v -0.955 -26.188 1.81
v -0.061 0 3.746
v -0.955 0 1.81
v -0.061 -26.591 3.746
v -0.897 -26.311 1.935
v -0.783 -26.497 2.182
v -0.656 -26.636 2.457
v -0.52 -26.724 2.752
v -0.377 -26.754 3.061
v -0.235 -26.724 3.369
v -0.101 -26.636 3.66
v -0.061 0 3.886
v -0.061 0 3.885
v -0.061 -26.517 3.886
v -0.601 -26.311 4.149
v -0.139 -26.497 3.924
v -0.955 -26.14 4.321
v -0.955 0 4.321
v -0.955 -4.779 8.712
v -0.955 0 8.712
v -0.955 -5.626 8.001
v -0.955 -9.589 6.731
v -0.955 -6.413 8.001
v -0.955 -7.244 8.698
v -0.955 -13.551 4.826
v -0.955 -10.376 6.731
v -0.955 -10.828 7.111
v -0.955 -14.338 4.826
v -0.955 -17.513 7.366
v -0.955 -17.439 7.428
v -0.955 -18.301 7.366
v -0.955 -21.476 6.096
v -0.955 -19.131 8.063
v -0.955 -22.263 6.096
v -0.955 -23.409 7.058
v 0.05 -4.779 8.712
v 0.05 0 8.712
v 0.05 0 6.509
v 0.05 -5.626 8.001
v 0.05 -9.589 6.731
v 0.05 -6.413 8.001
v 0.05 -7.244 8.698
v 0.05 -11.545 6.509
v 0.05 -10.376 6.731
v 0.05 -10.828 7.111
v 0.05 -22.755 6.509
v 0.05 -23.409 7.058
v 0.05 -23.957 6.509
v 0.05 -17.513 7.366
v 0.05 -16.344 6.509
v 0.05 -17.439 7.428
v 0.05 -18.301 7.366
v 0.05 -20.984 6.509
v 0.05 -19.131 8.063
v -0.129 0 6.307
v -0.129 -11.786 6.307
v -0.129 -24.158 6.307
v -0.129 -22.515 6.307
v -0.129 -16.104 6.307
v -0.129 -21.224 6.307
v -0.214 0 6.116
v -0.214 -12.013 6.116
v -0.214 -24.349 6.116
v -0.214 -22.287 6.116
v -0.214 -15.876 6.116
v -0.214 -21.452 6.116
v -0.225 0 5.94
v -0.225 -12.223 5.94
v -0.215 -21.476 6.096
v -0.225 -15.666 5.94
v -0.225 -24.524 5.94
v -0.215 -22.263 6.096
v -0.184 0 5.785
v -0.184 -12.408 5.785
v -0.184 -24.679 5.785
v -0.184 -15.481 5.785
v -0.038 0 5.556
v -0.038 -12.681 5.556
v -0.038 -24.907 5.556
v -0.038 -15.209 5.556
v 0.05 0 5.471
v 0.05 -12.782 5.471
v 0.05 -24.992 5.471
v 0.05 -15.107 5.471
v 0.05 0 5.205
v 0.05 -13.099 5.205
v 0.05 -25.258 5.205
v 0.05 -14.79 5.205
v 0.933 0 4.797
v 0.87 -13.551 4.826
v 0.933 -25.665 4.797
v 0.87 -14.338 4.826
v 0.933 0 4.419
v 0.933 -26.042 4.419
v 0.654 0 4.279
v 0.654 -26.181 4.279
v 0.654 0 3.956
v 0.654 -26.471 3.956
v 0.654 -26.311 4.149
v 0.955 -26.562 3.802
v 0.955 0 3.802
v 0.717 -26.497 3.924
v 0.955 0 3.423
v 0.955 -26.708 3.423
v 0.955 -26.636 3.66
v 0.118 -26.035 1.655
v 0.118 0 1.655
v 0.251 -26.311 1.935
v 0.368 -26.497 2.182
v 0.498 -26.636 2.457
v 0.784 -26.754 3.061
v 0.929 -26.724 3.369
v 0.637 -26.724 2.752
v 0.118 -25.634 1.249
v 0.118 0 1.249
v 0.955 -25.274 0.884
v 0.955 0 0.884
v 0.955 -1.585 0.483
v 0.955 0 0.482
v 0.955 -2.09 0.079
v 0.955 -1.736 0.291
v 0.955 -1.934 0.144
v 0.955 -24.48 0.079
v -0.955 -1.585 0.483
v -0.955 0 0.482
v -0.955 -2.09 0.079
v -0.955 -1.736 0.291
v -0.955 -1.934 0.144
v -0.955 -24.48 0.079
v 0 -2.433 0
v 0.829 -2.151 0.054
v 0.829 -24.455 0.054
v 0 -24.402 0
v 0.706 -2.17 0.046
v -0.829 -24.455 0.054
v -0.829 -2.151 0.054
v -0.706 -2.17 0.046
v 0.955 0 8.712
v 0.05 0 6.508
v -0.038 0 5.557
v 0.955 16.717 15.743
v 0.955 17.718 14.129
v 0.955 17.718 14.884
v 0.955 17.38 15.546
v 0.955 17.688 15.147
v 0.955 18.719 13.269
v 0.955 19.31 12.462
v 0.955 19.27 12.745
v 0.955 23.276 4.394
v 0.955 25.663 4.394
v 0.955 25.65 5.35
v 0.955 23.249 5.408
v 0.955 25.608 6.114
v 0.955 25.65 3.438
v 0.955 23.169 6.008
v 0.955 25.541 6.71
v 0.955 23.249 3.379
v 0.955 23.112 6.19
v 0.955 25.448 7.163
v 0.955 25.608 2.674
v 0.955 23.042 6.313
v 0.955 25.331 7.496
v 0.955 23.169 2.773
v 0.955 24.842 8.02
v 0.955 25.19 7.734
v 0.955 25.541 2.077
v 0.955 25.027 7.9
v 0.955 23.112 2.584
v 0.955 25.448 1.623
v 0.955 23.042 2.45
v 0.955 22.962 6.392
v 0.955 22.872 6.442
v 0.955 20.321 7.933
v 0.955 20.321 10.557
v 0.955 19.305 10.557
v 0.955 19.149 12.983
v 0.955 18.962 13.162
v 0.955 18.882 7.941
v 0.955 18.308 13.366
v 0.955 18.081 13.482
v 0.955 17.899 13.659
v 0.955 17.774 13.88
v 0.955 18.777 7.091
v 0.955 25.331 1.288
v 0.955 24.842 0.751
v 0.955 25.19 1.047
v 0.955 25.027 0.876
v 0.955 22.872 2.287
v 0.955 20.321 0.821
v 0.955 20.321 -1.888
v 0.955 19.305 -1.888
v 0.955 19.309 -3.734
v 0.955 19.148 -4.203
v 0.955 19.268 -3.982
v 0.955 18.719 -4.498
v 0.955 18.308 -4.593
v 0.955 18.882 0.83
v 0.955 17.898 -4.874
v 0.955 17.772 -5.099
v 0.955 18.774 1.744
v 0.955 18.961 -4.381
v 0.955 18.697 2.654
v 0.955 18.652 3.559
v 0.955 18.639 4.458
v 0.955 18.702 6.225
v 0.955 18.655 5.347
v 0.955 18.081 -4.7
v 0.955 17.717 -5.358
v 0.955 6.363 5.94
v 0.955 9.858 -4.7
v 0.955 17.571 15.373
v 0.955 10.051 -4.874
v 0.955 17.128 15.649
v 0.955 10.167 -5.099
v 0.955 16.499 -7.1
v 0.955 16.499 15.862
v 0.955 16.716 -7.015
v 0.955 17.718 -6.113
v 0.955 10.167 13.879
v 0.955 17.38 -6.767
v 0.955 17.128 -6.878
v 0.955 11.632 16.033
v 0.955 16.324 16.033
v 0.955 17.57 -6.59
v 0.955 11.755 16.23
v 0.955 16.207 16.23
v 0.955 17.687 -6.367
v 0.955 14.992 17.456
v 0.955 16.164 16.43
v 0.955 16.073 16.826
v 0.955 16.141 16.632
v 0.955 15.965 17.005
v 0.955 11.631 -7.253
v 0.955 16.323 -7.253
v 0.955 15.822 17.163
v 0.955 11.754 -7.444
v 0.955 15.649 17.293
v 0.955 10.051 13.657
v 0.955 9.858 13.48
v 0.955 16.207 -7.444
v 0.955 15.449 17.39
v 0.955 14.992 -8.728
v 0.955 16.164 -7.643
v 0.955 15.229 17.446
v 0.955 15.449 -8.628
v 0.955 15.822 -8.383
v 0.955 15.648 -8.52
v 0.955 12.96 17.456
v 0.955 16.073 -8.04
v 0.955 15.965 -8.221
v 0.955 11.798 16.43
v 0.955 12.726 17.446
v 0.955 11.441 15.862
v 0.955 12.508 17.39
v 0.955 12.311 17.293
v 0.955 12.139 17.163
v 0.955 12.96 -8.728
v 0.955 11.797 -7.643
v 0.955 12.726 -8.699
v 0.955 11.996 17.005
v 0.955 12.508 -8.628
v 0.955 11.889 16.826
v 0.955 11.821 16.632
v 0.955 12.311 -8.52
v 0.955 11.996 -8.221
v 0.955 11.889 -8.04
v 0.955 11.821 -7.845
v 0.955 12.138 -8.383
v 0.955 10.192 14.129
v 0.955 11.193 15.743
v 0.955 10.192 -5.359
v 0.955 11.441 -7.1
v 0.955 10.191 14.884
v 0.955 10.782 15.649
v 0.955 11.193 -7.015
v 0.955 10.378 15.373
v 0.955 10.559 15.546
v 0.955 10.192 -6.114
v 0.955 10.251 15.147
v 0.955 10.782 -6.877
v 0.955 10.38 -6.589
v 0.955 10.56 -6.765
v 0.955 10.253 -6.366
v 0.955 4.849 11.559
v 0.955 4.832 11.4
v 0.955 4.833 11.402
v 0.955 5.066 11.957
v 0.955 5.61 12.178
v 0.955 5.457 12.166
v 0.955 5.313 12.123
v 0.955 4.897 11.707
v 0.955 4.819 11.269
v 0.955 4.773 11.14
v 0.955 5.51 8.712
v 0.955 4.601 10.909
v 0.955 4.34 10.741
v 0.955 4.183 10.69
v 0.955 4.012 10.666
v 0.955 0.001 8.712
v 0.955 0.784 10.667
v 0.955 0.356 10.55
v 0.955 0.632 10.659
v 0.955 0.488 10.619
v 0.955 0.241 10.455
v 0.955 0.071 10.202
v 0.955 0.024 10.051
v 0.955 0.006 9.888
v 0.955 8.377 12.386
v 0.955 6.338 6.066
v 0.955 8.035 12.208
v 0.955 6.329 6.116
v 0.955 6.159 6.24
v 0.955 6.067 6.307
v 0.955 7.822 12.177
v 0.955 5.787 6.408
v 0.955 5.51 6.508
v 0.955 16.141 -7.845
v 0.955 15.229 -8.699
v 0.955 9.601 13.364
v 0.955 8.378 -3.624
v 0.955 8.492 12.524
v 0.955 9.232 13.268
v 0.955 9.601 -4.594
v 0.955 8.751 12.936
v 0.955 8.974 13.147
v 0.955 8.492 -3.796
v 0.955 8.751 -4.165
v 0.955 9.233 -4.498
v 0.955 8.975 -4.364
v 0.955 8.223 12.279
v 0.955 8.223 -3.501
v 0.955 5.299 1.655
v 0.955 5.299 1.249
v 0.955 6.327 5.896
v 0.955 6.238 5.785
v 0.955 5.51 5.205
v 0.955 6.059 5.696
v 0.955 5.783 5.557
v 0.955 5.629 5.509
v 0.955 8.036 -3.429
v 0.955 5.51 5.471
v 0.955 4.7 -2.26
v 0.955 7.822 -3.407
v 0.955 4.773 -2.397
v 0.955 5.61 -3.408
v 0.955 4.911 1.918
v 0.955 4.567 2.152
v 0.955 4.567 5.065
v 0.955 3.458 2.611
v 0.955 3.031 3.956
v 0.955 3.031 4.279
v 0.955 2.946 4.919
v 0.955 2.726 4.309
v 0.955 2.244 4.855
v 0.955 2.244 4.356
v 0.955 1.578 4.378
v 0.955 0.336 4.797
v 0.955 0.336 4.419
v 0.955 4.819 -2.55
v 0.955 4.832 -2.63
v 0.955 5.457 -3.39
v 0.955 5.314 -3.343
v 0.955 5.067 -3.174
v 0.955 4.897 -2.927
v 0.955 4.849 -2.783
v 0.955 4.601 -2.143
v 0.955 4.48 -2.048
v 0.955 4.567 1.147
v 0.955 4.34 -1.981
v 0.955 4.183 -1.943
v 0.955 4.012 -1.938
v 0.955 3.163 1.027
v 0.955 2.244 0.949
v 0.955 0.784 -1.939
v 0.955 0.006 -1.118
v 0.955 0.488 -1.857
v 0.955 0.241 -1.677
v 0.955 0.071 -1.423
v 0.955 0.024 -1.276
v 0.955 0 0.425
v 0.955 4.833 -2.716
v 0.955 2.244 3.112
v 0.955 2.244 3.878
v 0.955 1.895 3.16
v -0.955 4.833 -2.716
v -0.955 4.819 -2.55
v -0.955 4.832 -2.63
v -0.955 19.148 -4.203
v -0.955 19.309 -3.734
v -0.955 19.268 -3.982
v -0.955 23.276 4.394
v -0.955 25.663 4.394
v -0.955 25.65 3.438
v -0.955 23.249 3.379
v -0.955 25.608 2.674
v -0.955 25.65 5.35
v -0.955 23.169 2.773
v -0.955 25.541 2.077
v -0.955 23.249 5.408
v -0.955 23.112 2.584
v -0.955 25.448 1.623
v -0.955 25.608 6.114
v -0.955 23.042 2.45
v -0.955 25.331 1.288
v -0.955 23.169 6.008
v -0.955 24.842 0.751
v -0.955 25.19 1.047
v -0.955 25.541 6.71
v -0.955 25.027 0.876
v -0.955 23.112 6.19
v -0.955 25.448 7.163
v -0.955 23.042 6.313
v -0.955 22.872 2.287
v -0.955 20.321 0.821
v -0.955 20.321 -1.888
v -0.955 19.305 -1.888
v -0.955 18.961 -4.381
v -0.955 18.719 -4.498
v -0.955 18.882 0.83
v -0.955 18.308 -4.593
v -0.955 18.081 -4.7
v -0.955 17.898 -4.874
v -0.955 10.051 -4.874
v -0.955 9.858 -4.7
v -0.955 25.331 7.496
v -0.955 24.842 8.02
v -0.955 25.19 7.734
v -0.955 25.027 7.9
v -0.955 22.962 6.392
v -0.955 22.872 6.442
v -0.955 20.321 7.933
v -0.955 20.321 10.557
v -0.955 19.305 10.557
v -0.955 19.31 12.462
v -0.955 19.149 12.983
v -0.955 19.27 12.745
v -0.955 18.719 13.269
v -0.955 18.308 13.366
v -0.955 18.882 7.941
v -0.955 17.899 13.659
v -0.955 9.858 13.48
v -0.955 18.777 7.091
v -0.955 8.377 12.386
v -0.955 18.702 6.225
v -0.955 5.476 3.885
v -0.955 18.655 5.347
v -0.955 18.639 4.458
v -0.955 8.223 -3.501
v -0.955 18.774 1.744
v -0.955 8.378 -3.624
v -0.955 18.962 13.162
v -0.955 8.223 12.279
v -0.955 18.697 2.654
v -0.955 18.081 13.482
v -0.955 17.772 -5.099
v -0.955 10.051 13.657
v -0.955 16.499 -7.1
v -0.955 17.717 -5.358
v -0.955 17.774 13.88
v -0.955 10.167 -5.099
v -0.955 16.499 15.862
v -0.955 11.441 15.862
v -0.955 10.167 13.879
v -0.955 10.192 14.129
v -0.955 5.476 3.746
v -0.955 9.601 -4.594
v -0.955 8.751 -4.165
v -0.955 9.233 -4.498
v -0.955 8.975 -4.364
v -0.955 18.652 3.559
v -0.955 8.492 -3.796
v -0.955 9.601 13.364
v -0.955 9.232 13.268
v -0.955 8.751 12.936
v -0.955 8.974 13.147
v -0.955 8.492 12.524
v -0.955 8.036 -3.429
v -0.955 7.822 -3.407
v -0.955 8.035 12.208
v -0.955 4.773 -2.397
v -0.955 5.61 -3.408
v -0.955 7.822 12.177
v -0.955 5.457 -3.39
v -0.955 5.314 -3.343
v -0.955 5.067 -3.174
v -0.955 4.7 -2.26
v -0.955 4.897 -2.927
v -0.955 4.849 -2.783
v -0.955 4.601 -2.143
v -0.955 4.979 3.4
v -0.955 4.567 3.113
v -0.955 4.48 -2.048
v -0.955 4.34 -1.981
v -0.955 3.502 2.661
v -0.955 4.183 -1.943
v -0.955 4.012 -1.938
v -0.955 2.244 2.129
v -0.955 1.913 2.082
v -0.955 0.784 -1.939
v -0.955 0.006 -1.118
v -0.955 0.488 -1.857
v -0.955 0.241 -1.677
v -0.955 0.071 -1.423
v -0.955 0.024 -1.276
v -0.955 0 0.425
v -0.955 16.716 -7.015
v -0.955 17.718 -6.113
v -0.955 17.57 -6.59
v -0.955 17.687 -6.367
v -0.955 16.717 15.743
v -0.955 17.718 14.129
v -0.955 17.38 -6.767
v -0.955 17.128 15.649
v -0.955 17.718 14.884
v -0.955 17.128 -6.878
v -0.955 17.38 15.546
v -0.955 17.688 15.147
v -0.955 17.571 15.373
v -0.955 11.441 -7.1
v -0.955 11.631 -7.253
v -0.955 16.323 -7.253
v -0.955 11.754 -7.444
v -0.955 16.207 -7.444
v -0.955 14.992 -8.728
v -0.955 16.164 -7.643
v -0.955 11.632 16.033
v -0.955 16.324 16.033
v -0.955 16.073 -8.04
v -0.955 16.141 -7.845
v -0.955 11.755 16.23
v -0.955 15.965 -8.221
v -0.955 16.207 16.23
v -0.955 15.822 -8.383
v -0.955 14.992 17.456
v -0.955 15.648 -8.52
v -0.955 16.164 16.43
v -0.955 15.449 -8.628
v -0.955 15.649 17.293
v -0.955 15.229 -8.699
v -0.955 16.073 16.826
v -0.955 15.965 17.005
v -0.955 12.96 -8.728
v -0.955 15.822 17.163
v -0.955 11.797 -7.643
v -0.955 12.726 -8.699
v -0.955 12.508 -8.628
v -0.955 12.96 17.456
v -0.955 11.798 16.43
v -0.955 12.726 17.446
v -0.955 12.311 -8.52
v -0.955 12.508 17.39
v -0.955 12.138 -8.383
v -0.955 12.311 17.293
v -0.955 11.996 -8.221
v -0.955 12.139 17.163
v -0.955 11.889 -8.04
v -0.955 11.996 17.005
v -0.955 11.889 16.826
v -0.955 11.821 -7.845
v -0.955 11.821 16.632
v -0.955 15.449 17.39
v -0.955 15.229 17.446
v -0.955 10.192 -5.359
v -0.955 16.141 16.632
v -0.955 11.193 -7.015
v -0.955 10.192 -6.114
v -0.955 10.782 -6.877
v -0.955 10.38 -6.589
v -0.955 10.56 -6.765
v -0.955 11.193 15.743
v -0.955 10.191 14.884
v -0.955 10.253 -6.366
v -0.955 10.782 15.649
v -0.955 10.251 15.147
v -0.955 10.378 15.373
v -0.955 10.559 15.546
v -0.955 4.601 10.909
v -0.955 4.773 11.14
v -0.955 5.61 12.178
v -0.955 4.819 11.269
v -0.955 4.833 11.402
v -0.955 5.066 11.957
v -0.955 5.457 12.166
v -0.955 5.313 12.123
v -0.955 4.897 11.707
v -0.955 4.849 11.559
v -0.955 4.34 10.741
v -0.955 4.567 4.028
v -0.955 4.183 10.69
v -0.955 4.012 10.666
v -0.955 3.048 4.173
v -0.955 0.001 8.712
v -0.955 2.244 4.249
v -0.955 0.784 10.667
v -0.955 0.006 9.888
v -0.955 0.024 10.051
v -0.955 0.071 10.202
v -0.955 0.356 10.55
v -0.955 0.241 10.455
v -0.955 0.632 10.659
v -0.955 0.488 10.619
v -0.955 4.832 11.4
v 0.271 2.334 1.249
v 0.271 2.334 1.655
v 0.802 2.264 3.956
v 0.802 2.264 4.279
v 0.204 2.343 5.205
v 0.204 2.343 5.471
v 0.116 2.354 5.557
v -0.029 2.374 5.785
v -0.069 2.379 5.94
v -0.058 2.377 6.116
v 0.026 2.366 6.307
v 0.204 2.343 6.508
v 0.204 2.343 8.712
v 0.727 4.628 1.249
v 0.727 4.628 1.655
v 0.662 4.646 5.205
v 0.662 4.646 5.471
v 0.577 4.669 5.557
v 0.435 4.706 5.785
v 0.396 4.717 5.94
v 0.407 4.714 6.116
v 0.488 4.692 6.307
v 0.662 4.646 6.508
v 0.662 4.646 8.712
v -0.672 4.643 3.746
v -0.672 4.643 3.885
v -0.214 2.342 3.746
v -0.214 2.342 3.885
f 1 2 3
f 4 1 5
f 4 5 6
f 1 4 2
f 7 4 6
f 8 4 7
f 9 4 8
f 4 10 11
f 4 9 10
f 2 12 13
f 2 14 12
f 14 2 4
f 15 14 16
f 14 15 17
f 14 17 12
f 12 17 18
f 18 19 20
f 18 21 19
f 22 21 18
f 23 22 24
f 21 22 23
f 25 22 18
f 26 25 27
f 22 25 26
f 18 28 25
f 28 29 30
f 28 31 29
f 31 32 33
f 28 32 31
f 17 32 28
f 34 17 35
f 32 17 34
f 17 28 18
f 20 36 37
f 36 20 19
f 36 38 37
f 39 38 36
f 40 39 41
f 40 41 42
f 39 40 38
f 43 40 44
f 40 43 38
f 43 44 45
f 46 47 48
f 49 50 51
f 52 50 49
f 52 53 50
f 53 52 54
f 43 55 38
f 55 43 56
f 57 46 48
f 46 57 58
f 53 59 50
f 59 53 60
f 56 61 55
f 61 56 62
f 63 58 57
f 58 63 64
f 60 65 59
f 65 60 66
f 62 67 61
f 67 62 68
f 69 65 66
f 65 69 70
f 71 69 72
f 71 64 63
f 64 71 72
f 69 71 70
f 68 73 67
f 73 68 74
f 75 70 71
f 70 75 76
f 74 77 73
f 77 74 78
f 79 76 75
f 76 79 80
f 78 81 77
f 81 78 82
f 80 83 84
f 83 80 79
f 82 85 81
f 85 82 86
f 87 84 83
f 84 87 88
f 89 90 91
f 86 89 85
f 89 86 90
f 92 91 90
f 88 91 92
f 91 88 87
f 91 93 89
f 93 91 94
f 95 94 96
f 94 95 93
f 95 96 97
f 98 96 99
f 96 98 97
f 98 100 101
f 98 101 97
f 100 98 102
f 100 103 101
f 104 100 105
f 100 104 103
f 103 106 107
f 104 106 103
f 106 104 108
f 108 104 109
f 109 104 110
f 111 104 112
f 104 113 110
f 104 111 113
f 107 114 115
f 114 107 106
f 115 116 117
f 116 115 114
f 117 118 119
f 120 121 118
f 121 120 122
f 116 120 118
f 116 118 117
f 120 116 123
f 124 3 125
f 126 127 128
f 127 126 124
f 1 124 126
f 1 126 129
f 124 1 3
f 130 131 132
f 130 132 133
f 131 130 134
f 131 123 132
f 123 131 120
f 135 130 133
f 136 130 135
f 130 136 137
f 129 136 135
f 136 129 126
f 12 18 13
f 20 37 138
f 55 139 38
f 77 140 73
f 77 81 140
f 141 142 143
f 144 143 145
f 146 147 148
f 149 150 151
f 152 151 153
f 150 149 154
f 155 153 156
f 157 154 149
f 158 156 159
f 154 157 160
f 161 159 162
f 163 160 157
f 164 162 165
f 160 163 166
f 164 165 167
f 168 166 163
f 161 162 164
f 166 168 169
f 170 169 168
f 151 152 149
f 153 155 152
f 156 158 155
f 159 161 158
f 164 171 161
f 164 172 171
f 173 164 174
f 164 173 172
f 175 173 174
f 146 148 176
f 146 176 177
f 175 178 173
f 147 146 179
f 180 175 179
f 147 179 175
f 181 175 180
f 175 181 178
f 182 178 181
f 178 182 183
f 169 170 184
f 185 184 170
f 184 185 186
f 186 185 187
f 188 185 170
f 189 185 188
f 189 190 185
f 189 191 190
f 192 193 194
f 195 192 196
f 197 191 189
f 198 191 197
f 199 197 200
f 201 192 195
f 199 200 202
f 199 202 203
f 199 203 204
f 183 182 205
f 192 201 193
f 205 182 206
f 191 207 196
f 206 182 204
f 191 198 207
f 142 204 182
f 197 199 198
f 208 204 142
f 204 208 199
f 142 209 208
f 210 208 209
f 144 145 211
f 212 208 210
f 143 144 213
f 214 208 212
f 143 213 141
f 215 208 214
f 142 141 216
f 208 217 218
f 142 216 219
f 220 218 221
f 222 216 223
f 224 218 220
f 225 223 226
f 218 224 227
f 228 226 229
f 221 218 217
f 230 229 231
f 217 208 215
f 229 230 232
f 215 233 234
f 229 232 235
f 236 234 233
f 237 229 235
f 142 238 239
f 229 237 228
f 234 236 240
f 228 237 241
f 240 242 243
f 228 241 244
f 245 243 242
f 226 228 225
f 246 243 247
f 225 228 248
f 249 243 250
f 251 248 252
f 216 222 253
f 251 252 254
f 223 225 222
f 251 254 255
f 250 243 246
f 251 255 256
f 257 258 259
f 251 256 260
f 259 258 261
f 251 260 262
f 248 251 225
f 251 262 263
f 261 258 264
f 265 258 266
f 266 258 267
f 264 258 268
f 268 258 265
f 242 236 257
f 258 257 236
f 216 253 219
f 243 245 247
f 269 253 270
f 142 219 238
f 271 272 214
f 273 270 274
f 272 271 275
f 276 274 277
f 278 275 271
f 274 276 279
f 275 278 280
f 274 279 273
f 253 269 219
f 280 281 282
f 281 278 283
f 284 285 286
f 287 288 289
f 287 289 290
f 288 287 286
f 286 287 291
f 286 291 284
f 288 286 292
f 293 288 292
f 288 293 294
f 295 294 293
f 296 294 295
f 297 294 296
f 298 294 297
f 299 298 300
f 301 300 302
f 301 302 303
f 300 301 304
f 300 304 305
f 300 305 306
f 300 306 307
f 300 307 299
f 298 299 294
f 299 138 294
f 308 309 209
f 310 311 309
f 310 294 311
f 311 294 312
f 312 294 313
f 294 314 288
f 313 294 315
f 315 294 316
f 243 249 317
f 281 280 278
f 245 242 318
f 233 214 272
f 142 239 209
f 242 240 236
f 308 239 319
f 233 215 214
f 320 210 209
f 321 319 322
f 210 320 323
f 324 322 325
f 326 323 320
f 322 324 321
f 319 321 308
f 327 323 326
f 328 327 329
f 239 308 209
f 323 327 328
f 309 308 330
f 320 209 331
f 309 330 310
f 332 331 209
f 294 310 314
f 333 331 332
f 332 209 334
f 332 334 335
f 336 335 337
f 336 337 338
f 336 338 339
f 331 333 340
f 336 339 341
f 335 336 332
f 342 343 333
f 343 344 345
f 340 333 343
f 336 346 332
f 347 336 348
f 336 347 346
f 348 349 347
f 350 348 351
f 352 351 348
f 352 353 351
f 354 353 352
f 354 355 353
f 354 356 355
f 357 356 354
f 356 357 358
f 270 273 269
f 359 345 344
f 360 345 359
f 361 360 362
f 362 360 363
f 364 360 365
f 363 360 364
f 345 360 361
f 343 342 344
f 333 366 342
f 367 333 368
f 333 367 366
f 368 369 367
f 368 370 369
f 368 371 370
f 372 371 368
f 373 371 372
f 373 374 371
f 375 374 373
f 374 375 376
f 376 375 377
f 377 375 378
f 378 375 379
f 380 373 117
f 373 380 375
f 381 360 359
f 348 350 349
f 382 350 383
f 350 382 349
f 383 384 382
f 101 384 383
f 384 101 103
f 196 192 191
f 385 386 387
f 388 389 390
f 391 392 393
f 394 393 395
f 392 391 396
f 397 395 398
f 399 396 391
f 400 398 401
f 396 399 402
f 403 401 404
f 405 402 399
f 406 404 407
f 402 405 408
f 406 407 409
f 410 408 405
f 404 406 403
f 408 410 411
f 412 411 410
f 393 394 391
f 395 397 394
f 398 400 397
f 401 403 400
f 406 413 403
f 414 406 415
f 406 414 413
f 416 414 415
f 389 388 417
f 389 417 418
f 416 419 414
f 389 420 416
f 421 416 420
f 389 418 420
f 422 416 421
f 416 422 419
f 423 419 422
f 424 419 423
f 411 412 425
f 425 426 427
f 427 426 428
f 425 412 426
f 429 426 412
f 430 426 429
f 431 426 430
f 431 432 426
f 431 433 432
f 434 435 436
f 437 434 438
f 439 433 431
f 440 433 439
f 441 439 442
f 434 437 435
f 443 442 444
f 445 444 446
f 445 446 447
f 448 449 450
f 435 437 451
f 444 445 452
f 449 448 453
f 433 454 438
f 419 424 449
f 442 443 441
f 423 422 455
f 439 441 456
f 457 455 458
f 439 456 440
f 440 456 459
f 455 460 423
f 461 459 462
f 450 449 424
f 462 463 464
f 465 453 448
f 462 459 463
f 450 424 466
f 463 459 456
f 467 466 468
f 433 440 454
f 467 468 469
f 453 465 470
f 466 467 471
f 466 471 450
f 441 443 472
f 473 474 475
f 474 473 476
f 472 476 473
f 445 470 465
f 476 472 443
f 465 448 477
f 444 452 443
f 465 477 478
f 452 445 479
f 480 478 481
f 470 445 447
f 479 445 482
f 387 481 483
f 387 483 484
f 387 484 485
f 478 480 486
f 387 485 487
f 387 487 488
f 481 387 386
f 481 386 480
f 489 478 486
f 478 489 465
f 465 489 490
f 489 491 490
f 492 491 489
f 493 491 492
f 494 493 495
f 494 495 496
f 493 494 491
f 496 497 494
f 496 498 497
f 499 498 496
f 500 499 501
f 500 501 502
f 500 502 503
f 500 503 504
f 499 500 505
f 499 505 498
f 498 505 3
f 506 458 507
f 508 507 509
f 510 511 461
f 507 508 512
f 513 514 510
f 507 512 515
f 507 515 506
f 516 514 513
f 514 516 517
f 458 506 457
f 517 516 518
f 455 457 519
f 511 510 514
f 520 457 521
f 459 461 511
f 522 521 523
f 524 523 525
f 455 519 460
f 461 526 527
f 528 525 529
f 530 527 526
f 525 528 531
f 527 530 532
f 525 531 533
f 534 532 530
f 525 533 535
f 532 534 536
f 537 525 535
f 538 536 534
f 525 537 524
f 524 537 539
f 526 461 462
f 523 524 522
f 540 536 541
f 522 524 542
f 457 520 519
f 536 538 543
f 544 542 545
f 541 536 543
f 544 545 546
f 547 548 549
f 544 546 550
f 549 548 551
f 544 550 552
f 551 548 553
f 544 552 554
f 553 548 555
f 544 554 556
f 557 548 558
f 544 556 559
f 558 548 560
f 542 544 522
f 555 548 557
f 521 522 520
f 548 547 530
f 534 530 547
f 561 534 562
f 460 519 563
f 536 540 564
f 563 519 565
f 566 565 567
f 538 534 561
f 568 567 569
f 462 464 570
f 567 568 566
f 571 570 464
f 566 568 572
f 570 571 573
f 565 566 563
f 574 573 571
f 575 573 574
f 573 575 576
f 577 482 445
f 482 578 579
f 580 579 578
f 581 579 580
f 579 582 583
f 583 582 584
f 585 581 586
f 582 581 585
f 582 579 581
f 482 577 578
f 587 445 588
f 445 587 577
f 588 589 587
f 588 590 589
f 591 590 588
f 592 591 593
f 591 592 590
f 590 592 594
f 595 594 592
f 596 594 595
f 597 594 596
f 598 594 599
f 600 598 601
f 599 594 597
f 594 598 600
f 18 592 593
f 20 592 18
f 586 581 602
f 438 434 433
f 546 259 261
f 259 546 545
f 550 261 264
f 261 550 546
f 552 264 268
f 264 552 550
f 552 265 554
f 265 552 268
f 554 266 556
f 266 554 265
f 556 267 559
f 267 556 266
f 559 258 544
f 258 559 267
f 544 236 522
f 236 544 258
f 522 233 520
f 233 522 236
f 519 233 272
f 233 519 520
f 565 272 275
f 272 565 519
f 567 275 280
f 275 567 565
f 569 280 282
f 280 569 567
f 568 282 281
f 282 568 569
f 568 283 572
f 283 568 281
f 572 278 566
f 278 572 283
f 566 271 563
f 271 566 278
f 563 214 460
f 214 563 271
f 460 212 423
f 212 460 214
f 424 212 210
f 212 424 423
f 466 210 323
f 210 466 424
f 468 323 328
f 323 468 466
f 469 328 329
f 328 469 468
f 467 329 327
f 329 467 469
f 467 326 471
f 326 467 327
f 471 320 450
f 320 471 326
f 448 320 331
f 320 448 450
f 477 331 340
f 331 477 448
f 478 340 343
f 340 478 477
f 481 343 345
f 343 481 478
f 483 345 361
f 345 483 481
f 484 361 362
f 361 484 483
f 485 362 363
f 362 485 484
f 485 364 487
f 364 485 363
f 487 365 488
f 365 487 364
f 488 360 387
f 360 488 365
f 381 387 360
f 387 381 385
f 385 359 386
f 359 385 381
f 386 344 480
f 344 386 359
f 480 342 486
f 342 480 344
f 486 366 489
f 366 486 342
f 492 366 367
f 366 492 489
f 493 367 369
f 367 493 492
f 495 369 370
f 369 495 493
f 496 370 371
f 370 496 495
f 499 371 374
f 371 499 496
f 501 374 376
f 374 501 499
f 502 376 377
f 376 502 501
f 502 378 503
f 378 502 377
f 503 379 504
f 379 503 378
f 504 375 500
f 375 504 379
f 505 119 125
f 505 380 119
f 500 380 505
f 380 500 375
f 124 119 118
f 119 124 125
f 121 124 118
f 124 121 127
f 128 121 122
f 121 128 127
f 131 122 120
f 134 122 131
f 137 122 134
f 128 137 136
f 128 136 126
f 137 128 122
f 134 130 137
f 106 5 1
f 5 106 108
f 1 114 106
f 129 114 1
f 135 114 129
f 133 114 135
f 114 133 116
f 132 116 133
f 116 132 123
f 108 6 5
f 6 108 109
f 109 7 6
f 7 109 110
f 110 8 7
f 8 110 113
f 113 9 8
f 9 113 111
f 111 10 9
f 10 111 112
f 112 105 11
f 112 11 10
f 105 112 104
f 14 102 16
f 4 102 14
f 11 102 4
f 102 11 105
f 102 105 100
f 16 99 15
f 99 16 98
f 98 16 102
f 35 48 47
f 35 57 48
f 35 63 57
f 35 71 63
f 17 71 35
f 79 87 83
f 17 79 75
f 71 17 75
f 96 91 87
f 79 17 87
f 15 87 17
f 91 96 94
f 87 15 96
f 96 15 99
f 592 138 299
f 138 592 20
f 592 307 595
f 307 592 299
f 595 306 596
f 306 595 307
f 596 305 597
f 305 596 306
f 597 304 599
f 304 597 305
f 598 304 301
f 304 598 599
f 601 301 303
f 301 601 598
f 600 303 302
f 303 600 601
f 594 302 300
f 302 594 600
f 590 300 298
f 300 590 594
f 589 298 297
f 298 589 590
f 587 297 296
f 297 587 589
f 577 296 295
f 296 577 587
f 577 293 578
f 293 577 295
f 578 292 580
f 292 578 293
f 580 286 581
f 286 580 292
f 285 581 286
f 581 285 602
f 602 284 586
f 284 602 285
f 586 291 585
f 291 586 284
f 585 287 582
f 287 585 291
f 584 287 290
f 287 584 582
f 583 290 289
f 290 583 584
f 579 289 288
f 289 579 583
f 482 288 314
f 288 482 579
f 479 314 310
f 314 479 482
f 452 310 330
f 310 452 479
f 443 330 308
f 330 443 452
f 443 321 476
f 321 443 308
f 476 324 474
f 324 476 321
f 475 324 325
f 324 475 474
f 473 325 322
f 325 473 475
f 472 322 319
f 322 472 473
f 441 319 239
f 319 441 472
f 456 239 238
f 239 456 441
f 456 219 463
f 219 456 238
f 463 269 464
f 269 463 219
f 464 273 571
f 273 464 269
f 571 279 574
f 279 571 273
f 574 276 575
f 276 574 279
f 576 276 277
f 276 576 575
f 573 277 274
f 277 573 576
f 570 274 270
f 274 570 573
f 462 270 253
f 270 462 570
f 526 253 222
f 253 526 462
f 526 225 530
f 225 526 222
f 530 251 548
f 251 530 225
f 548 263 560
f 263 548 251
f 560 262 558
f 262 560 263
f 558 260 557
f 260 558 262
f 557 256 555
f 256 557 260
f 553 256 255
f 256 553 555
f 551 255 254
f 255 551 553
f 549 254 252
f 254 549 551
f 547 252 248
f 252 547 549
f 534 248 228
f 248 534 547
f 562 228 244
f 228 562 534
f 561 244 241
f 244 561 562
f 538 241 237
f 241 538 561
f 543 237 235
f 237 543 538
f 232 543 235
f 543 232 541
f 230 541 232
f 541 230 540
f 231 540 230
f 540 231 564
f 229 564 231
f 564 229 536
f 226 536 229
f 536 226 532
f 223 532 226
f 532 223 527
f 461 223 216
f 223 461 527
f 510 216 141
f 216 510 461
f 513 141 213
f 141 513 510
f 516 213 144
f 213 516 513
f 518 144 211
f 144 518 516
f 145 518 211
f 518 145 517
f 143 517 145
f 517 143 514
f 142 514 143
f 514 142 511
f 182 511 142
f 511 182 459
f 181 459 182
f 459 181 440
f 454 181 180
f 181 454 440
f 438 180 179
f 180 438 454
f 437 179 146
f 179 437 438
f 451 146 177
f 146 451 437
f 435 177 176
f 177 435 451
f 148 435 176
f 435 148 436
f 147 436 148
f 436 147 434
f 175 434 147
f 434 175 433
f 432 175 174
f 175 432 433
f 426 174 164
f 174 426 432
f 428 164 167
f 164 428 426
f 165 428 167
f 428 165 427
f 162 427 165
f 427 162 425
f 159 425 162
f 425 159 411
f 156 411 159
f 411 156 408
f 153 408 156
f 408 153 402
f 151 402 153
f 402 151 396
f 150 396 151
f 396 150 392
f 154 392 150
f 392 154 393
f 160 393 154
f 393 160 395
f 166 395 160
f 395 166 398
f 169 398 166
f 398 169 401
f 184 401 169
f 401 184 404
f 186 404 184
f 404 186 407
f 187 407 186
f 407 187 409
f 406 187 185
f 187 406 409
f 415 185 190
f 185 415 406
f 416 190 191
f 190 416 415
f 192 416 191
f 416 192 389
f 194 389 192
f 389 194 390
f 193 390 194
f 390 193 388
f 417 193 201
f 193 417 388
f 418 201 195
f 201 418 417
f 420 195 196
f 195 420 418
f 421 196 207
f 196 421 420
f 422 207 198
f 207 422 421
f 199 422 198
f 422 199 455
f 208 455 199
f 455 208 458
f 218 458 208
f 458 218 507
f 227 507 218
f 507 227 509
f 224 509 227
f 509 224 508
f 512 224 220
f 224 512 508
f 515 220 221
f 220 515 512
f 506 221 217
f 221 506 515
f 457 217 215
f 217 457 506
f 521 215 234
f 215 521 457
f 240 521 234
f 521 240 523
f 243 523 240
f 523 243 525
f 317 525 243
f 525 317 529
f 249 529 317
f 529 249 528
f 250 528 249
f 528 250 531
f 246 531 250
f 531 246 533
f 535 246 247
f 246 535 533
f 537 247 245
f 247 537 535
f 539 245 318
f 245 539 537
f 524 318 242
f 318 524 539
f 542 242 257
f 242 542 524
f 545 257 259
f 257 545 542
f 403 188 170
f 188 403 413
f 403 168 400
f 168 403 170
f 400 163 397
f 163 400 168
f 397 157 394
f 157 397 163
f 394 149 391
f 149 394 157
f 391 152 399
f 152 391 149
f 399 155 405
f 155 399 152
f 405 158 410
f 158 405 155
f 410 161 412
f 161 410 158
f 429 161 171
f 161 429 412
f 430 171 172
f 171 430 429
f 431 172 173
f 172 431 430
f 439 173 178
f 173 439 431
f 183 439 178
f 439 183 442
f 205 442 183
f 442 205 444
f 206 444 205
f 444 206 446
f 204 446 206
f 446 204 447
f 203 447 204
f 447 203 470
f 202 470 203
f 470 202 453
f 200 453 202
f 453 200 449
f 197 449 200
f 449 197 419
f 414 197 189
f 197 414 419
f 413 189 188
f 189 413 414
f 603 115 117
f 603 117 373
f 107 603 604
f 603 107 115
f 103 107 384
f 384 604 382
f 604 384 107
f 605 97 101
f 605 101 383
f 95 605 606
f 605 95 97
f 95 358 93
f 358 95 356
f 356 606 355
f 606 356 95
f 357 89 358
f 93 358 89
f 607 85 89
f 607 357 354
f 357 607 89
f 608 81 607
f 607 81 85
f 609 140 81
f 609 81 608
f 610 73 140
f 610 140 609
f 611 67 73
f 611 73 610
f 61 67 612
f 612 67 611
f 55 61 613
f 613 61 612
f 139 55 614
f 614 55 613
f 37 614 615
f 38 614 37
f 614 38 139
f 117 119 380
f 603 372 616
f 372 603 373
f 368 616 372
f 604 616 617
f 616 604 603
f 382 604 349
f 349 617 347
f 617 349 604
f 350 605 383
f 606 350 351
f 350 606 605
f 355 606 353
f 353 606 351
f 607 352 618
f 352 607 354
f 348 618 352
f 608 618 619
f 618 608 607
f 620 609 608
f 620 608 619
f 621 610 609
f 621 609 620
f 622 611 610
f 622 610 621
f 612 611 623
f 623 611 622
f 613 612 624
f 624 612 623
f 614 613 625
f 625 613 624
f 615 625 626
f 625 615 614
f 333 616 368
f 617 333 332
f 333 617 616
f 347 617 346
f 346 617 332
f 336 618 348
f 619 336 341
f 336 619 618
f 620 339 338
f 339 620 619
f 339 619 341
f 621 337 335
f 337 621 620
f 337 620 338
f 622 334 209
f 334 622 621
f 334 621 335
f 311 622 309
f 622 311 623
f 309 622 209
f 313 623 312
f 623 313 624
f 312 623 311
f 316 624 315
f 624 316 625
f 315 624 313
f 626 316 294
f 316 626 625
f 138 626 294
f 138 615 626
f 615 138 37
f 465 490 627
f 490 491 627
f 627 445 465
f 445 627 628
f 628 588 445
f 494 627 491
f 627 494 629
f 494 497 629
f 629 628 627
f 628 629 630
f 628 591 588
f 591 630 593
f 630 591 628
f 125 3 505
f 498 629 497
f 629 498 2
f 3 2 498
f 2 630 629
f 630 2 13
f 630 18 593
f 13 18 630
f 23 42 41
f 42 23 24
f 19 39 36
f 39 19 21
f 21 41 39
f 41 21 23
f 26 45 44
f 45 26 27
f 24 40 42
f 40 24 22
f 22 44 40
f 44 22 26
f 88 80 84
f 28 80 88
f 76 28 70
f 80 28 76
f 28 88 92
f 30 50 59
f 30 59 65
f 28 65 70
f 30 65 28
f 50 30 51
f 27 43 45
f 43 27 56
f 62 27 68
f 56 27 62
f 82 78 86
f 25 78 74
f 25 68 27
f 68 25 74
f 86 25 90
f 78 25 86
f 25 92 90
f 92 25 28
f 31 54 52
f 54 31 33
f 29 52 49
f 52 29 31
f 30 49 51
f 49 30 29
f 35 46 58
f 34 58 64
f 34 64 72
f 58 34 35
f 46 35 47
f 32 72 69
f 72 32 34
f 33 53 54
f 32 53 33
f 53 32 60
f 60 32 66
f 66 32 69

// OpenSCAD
use <keygen.scad>
include <falcon.gen.scad>

module falcon_025(bitting="",
                       outline_name="M",
                       warding_name="M") {

    name = "Falcon 025";

    /*
        Bitting is specified from bow to tip, 0-6, with 0 being the shallowest cut and 6 being the deepest.
        Example: 25363
    */

    outlines_k = ["M"];
    outlines_v = [[outline_m_points, outline_m_paths,
                   [-outline_m_points[92][0], -outline_m_points[98][1]],
                   engrave_m_points,
                   engrave_m_paths]];
    wardings_k = ["M"];
    wardings_v = [warding_m_points];

    outline_param = key_lkup(outlines_k, outlines_v, outline_name);
    outline_points = outline_param[0];
    outline_paths = outline_param[1];
    offset = outline_param[2];
    engrave_points = outline_param[3];
    engrave_paths = outline_param[4];

    warding_points = key_lkup(wardings_k, wardings_v, warding_name);
    
    cut_locations = [for(i=[.237, .393, .549, .705, .861, 1.017]) i*25.4];
    depth_table = [for(i=[0.340:-0.025:0.189]) i*25.4];

    heights = key_code_to_heights(bitting, depth_table);

    difference() {
        if($children == 0) {
            key_blank(outline_points,
                      warding_points,
                      outline_paths=outline_paths,
                      engrave_right_points=engrave_points,
                      engrave_right_paths=engrave_paths,
                      engrave_left_points=engrave_points,
                      engrave_left_paths=engrave_paths,
                      offset=offset,
                      plug_diameter=12.7);
        } else {
            children(0);
        }
        key_bitting(heights, cut_locations, .7874);
    }
}

// Defaults
bitting="136240";
outline="M";
warding="M";
falcon_025(bitting, outline, warding);
